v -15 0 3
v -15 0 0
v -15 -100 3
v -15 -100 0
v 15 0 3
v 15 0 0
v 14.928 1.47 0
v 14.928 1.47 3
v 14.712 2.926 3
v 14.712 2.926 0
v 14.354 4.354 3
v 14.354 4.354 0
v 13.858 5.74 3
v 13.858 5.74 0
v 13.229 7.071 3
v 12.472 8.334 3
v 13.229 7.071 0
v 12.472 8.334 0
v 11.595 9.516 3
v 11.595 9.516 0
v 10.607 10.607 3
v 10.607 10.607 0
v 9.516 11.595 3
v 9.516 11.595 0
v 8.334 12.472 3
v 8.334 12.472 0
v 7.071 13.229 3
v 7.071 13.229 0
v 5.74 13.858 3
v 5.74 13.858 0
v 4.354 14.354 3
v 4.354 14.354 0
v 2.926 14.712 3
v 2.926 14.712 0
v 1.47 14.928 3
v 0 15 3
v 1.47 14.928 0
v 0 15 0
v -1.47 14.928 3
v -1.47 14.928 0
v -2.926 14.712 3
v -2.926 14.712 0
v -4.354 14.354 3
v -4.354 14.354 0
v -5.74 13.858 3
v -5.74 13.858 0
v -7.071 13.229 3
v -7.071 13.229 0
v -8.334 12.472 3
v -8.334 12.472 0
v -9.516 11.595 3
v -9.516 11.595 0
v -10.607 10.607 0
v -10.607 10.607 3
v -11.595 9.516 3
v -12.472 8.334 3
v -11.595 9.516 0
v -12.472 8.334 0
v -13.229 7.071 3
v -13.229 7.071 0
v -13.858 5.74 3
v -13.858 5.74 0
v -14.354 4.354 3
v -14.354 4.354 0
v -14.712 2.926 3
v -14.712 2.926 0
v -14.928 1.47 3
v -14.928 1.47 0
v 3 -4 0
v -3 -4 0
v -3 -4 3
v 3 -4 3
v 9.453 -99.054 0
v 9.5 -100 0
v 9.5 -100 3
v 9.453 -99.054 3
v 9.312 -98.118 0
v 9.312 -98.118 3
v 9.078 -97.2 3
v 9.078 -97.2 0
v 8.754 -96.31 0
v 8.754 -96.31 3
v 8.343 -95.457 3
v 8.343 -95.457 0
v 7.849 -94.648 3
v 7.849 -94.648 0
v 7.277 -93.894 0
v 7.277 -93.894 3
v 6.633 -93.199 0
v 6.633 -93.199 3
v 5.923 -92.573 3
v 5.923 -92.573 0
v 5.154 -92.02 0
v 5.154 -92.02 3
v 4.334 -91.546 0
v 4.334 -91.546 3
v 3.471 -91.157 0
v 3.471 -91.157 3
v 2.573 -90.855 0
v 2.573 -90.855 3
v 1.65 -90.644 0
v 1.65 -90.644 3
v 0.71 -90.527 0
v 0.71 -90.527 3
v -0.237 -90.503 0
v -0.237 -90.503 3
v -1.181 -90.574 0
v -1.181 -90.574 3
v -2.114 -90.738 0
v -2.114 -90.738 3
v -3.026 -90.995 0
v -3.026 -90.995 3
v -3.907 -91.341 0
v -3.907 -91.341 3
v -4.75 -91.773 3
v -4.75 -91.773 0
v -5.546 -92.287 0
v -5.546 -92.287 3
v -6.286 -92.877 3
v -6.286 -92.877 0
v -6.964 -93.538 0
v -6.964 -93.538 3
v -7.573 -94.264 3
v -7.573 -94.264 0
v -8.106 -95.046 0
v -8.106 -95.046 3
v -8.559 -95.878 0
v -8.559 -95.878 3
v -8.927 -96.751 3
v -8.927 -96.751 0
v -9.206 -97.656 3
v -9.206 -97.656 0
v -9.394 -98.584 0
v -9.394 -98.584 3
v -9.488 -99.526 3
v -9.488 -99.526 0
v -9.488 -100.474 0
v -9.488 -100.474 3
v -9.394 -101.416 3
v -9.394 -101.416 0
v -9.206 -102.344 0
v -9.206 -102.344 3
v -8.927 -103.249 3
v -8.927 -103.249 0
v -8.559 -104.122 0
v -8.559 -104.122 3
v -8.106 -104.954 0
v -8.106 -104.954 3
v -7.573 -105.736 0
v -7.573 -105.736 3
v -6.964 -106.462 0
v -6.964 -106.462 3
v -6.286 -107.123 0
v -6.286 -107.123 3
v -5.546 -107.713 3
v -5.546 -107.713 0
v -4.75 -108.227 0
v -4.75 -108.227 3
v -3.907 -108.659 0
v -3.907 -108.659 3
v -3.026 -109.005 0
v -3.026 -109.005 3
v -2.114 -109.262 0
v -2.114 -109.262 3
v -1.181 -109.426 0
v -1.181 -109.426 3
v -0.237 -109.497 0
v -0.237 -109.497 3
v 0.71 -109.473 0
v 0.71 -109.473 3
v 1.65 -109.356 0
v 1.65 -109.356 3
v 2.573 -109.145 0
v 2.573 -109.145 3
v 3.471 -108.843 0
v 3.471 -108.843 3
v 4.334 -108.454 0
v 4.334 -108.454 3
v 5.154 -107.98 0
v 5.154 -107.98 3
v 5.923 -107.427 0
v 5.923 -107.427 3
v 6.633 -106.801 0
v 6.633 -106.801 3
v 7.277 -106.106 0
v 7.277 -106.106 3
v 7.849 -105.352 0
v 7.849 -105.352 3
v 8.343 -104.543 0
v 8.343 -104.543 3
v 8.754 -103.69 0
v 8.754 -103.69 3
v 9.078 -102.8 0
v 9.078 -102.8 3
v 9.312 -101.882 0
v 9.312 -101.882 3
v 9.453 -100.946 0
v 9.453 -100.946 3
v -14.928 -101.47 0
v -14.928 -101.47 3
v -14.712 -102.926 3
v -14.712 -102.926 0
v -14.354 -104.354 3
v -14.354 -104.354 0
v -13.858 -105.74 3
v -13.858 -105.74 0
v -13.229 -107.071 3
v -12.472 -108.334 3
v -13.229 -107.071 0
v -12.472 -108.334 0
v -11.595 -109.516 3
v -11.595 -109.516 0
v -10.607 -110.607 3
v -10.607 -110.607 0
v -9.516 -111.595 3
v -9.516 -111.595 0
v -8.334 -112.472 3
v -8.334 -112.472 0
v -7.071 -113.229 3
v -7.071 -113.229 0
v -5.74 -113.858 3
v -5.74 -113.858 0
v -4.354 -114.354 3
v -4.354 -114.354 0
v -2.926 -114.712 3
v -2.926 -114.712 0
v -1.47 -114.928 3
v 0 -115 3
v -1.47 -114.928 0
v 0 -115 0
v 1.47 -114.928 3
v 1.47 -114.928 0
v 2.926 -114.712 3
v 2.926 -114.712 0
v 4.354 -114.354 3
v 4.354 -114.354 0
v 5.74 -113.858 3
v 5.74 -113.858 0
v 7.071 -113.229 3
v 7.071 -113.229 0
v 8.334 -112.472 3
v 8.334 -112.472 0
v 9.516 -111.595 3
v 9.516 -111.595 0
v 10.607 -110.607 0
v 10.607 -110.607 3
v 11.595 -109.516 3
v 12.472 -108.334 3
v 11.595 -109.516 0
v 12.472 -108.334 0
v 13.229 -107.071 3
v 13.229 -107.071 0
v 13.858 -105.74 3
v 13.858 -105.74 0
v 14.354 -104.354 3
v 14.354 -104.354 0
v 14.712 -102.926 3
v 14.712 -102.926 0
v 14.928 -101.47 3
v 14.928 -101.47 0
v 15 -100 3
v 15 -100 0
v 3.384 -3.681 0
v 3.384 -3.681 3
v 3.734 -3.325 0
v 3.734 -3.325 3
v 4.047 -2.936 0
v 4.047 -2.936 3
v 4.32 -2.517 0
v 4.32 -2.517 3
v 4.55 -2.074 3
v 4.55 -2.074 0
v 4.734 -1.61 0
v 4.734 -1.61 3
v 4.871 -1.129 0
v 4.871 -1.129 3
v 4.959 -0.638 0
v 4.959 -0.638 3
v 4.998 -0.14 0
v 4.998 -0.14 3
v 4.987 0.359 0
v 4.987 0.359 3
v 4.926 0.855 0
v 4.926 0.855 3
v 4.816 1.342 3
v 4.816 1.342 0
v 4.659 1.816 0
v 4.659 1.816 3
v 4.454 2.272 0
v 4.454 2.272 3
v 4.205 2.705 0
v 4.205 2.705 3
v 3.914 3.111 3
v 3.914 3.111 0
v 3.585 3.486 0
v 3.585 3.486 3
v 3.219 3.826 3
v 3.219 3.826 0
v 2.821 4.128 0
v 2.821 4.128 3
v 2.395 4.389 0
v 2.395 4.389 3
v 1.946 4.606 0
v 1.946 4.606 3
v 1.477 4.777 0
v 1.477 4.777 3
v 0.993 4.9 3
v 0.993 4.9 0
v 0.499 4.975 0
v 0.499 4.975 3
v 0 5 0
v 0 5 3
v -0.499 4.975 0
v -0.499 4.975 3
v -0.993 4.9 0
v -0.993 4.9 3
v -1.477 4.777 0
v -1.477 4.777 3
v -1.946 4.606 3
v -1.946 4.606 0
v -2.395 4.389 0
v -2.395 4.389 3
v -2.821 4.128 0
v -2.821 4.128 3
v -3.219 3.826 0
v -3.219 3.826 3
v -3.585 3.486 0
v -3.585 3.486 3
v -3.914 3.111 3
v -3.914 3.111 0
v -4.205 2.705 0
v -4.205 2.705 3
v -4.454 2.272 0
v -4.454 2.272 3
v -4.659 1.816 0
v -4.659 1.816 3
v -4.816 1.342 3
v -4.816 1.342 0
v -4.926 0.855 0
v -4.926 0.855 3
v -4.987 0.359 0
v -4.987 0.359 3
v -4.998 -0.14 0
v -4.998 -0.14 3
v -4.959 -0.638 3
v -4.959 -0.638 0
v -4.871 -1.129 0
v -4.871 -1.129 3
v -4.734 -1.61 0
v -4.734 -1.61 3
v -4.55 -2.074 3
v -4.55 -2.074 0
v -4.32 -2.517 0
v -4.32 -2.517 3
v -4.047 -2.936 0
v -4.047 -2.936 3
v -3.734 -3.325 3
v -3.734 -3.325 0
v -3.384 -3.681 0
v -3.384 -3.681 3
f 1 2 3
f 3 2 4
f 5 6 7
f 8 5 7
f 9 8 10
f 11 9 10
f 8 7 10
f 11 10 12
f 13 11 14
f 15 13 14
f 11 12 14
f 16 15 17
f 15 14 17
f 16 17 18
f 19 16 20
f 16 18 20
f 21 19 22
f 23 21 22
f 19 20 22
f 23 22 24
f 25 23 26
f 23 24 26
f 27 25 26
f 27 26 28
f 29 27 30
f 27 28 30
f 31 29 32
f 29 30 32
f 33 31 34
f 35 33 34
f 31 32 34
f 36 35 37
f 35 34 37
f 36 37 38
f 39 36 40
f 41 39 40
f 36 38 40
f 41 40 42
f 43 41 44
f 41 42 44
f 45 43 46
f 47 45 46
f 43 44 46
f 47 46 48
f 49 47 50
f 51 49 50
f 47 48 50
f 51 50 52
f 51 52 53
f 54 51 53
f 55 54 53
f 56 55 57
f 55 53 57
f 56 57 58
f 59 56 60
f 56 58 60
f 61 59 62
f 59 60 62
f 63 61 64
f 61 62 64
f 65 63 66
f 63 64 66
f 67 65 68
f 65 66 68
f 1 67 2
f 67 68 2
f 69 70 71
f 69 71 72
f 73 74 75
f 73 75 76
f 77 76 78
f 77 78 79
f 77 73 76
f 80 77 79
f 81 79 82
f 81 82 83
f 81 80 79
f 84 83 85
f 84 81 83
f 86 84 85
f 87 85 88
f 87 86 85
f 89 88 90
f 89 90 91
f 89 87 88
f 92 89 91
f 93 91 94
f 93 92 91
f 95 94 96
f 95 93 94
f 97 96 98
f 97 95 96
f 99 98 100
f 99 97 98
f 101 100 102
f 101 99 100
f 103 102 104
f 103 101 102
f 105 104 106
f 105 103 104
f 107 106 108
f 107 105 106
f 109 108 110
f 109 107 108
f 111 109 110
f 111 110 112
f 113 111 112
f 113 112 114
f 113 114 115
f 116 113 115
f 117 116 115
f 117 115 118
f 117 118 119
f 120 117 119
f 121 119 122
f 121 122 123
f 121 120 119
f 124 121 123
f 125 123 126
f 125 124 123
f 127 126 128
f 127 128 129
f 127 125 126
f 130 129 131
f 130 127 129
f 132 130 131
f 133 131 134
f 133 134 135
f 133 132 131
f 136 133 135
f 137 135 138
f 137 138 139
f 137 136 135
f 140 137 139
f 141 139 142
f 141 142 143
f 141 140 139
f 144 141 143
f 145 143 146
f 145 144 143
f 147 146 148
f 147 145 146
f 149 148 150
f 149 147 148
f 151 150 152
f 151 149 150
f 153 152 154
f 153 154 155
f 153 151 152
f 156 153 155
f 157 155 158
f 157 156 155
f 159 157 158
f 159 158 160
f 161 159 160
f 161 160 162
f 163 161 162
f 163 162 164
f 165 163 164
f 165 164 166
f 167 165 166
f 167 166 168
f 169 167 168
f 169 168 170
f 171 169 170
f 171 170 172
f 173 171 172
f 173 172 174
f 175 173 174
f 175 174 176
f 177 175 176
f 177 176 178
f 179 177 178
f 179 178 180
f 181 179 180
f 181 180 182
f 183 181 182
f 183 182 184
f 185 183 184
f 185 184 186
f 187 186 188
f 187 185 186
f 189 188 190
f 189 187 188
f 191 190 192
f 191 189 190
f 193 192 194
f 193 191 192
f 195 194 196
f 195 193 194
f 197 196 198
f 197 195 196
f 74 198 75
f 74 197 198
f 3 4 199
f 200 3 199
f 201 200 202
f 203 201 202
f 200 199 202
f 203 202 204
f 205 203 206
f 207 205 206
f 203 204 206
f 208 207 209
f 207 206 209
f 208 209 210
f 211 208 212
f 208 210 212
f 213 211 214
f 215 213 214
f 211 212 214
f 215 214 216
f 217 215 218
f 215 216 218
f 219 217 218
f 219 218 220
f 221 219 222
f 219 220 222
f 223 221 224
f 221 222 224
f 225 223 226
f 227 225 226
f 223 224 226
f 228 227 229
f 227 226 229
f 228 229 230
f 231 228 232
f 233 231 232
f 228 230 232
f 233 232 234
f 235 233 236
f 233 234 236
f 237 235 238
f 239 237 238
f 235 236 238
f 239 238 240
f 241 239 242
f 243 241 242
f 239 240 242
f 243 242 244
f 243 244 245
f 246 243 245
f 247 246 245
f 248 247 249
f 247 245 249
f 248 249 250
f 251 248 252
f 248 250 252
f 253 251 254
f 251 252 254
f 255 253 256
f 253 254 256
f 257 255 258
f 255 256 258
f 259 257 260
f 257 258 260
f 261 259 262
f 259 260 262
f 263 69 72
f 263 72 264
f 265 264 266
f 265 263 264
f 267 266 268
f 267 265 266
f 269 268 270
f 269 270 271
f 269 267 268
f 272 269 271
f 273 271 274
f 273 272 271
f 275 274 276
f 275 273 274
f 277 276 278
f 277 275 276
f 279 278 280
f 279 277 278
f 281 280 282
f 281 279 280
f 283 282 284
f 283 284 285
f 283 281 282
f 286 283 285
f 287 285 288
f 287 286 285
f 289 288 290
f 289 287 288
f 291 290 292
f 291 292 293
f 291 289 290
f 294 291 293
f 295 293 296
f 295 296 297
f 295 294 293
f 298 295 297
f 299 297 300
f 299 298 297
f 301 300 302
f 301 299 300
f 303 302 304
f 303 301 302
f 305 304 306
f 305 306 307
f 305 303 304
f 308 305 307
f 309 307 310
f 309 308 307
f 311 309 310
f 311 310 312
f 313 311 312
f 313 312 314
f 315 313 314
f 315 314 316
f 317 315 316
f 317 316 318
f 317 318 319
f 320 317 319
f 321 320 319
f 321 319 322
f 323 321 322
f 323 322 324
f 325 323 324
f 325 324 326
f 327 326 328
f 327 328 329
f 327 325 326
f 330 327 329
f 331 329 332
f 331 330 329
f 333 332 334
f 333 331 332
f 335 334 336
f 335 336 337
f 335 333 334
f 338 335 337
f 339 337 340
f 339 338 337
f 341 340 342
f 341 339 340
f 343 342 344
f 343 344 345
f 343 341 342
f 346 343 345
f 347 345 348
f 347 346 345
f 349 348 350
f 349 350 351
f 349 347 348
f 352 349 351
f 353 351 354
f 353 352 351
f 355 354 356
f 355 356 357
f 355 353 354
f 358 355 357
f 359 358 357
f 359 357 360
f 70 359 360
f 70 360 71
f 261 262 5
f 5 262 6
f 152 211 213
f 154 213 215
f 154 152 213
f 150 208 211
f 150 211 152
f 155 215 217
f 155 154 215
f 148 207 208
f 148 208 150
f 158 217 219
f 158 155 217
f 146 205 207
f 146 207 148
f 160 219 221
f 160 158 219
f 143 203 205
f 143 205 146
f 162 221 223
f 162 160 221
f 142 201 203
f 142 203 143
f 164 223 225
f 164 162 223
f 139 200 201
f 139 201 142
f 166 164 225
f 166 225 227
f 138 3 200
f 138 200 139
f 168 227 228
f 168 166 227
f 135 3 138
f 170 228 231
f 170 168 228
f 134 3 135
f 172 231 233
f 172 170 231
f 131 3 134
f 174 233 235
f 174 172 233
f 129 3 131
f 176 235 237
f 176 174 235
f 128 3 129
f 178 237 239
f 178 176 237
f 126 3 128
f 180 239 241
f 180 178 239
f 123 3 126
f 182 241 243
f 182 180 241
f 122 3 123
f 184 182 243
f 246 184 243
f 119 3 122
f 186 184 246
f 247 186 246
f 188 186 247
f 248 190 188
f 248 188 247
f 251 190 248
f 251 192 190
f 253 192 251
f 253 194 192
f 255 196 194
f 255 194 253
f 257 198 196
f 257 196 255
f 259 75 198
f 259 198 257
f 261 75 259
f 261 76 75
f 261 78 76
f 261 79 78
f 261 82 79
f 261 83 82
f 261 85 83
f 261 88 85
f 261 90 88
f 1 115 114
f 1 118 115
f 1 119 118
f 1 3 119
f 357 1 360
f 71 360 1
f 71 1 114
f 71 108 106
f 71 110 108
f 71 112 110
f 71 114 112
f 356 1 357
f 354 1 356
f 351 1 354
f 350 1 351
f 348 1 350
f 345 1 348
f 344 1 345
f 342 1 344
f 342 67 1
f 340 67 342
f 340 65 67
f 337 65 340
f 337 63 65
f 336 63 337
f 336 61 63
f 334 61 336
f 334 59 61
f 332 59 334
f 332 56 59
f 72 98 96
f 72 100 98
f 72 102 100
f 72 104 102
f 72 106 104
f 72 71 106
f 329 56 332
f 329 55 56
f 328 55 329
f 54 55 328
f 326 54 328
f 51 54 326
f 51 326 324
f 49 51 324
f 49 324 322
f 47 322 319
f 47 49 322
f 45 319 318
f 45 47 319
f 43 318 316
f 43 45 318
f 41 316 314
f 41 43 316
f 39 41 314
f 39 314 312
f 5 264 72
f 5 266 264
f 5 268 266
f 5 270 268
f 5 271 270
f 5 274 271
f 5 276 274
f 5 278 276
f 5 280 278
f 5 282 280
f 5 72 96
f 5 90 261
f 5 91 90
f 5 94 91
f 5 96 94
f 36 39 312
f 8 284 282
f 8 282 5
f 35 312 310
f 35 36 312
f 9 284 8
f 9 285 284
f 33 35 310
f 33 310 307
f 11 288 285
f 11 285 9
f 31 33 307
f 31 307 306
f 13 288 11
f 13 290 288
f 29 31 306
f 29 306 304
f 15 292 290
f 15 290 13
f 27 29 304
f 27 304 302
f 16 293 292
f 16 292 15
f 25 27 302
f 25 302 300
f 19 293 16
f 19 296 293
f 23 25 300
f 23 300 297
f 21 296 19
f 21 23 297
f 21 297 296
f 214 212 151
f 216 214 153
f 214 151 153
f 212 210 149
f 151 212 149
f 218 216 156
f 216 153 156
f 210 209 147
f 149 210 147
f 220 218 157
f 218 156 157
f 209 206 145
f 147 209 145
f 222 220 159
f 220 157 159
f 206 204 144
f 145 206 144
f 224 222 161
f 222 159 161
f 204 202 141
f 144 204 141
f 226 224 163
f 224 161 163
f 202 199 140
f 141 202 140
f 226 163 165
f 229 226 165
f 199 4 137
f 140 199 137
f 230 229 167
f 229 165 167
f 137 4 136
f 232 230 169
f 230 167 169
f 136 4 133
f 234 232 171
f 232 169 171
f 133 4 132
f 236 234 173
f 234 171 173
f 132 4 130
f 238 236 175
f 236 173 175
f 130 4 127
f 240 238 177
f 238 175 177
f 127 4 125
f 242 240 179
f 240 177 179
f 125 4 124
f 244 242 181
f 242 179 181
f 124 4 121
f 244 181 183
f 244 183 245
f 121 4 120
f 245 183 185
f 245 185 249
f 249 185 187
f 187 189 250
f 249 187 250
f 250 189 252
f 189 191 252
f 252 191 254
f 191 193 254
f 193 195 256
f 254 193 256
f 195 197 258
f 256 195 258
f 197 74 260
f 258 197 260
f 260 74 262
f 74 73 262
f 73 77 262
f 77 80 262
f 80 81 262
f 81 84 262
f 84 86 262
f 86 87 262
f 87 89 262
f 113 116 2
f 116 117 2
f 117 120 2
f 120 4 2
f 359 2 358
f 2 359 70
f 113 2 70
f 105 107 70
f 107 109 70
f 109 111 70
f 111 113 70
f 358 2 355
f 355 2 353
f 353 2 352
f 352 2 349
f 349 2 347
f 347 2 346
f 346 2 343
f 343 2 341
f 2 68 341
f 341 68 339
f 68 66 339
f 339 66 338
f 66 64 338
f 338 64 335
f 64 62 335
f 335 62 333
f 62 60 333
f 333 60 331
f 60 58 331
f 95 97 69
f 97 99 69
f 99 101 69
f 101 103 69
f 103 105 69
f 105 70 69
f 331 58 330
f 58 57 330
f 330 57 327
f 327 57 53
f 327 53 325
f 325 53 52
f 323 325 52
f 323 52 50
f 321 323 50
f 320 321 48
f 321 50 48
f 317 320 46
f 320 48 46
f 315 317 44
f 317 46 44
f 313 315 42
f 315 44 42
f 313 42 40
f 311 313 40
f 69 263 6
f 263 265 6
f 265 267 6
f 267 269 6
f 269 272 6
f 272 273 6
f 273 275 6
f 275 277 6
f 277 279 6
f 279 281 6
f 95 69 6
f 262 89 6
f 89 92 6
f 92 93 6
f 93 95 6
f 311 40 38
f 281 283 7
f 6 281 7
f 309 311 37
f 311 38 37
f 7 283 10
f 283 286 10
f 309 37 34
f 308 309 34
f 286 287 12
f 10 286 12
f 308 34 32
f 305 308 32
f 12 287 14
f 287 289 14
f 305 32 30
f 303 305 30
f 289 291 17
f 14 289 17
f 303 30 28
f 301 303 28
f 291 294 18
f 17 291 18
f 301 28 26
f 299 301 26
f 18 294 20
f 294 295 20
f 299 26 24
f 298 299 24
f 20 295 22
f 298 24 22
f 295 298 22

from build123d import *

# Parameters (mm, degrees)
SKETCH_1_R      = 9.5
EXTRUDE_1_DEPTH = 3


with BuildPart() as part:
    # 草图1 → 凸台-拉伸1 (new body)
    with BuildSketch(Plane.XY):
        with BuildLine():
            Line((-15, 0), (-15, -100))
            ThreePointArc((-15, -100), (0, -115), (15, -100))
            Line((15, -100), (15, 0))
            ThreePointArc((15, 0), (0, 15), (-15, 0))
        make_face()
        with Locations((0, -100)):
            Circle(SKETCH_1_R, mode=Mode.SUBTRACT)
        with BuildLine():
            Line((0, -4), (3, -4))
            ThreePointArc((3, -4), (0, 5), (-3, -4))
            Line((-3, -4), (0, -4))
        make_face(mode=Mode.SUBTRACT)
    extrude(amount=EXTRUDE_1_DEPTH)


solid = part.part
